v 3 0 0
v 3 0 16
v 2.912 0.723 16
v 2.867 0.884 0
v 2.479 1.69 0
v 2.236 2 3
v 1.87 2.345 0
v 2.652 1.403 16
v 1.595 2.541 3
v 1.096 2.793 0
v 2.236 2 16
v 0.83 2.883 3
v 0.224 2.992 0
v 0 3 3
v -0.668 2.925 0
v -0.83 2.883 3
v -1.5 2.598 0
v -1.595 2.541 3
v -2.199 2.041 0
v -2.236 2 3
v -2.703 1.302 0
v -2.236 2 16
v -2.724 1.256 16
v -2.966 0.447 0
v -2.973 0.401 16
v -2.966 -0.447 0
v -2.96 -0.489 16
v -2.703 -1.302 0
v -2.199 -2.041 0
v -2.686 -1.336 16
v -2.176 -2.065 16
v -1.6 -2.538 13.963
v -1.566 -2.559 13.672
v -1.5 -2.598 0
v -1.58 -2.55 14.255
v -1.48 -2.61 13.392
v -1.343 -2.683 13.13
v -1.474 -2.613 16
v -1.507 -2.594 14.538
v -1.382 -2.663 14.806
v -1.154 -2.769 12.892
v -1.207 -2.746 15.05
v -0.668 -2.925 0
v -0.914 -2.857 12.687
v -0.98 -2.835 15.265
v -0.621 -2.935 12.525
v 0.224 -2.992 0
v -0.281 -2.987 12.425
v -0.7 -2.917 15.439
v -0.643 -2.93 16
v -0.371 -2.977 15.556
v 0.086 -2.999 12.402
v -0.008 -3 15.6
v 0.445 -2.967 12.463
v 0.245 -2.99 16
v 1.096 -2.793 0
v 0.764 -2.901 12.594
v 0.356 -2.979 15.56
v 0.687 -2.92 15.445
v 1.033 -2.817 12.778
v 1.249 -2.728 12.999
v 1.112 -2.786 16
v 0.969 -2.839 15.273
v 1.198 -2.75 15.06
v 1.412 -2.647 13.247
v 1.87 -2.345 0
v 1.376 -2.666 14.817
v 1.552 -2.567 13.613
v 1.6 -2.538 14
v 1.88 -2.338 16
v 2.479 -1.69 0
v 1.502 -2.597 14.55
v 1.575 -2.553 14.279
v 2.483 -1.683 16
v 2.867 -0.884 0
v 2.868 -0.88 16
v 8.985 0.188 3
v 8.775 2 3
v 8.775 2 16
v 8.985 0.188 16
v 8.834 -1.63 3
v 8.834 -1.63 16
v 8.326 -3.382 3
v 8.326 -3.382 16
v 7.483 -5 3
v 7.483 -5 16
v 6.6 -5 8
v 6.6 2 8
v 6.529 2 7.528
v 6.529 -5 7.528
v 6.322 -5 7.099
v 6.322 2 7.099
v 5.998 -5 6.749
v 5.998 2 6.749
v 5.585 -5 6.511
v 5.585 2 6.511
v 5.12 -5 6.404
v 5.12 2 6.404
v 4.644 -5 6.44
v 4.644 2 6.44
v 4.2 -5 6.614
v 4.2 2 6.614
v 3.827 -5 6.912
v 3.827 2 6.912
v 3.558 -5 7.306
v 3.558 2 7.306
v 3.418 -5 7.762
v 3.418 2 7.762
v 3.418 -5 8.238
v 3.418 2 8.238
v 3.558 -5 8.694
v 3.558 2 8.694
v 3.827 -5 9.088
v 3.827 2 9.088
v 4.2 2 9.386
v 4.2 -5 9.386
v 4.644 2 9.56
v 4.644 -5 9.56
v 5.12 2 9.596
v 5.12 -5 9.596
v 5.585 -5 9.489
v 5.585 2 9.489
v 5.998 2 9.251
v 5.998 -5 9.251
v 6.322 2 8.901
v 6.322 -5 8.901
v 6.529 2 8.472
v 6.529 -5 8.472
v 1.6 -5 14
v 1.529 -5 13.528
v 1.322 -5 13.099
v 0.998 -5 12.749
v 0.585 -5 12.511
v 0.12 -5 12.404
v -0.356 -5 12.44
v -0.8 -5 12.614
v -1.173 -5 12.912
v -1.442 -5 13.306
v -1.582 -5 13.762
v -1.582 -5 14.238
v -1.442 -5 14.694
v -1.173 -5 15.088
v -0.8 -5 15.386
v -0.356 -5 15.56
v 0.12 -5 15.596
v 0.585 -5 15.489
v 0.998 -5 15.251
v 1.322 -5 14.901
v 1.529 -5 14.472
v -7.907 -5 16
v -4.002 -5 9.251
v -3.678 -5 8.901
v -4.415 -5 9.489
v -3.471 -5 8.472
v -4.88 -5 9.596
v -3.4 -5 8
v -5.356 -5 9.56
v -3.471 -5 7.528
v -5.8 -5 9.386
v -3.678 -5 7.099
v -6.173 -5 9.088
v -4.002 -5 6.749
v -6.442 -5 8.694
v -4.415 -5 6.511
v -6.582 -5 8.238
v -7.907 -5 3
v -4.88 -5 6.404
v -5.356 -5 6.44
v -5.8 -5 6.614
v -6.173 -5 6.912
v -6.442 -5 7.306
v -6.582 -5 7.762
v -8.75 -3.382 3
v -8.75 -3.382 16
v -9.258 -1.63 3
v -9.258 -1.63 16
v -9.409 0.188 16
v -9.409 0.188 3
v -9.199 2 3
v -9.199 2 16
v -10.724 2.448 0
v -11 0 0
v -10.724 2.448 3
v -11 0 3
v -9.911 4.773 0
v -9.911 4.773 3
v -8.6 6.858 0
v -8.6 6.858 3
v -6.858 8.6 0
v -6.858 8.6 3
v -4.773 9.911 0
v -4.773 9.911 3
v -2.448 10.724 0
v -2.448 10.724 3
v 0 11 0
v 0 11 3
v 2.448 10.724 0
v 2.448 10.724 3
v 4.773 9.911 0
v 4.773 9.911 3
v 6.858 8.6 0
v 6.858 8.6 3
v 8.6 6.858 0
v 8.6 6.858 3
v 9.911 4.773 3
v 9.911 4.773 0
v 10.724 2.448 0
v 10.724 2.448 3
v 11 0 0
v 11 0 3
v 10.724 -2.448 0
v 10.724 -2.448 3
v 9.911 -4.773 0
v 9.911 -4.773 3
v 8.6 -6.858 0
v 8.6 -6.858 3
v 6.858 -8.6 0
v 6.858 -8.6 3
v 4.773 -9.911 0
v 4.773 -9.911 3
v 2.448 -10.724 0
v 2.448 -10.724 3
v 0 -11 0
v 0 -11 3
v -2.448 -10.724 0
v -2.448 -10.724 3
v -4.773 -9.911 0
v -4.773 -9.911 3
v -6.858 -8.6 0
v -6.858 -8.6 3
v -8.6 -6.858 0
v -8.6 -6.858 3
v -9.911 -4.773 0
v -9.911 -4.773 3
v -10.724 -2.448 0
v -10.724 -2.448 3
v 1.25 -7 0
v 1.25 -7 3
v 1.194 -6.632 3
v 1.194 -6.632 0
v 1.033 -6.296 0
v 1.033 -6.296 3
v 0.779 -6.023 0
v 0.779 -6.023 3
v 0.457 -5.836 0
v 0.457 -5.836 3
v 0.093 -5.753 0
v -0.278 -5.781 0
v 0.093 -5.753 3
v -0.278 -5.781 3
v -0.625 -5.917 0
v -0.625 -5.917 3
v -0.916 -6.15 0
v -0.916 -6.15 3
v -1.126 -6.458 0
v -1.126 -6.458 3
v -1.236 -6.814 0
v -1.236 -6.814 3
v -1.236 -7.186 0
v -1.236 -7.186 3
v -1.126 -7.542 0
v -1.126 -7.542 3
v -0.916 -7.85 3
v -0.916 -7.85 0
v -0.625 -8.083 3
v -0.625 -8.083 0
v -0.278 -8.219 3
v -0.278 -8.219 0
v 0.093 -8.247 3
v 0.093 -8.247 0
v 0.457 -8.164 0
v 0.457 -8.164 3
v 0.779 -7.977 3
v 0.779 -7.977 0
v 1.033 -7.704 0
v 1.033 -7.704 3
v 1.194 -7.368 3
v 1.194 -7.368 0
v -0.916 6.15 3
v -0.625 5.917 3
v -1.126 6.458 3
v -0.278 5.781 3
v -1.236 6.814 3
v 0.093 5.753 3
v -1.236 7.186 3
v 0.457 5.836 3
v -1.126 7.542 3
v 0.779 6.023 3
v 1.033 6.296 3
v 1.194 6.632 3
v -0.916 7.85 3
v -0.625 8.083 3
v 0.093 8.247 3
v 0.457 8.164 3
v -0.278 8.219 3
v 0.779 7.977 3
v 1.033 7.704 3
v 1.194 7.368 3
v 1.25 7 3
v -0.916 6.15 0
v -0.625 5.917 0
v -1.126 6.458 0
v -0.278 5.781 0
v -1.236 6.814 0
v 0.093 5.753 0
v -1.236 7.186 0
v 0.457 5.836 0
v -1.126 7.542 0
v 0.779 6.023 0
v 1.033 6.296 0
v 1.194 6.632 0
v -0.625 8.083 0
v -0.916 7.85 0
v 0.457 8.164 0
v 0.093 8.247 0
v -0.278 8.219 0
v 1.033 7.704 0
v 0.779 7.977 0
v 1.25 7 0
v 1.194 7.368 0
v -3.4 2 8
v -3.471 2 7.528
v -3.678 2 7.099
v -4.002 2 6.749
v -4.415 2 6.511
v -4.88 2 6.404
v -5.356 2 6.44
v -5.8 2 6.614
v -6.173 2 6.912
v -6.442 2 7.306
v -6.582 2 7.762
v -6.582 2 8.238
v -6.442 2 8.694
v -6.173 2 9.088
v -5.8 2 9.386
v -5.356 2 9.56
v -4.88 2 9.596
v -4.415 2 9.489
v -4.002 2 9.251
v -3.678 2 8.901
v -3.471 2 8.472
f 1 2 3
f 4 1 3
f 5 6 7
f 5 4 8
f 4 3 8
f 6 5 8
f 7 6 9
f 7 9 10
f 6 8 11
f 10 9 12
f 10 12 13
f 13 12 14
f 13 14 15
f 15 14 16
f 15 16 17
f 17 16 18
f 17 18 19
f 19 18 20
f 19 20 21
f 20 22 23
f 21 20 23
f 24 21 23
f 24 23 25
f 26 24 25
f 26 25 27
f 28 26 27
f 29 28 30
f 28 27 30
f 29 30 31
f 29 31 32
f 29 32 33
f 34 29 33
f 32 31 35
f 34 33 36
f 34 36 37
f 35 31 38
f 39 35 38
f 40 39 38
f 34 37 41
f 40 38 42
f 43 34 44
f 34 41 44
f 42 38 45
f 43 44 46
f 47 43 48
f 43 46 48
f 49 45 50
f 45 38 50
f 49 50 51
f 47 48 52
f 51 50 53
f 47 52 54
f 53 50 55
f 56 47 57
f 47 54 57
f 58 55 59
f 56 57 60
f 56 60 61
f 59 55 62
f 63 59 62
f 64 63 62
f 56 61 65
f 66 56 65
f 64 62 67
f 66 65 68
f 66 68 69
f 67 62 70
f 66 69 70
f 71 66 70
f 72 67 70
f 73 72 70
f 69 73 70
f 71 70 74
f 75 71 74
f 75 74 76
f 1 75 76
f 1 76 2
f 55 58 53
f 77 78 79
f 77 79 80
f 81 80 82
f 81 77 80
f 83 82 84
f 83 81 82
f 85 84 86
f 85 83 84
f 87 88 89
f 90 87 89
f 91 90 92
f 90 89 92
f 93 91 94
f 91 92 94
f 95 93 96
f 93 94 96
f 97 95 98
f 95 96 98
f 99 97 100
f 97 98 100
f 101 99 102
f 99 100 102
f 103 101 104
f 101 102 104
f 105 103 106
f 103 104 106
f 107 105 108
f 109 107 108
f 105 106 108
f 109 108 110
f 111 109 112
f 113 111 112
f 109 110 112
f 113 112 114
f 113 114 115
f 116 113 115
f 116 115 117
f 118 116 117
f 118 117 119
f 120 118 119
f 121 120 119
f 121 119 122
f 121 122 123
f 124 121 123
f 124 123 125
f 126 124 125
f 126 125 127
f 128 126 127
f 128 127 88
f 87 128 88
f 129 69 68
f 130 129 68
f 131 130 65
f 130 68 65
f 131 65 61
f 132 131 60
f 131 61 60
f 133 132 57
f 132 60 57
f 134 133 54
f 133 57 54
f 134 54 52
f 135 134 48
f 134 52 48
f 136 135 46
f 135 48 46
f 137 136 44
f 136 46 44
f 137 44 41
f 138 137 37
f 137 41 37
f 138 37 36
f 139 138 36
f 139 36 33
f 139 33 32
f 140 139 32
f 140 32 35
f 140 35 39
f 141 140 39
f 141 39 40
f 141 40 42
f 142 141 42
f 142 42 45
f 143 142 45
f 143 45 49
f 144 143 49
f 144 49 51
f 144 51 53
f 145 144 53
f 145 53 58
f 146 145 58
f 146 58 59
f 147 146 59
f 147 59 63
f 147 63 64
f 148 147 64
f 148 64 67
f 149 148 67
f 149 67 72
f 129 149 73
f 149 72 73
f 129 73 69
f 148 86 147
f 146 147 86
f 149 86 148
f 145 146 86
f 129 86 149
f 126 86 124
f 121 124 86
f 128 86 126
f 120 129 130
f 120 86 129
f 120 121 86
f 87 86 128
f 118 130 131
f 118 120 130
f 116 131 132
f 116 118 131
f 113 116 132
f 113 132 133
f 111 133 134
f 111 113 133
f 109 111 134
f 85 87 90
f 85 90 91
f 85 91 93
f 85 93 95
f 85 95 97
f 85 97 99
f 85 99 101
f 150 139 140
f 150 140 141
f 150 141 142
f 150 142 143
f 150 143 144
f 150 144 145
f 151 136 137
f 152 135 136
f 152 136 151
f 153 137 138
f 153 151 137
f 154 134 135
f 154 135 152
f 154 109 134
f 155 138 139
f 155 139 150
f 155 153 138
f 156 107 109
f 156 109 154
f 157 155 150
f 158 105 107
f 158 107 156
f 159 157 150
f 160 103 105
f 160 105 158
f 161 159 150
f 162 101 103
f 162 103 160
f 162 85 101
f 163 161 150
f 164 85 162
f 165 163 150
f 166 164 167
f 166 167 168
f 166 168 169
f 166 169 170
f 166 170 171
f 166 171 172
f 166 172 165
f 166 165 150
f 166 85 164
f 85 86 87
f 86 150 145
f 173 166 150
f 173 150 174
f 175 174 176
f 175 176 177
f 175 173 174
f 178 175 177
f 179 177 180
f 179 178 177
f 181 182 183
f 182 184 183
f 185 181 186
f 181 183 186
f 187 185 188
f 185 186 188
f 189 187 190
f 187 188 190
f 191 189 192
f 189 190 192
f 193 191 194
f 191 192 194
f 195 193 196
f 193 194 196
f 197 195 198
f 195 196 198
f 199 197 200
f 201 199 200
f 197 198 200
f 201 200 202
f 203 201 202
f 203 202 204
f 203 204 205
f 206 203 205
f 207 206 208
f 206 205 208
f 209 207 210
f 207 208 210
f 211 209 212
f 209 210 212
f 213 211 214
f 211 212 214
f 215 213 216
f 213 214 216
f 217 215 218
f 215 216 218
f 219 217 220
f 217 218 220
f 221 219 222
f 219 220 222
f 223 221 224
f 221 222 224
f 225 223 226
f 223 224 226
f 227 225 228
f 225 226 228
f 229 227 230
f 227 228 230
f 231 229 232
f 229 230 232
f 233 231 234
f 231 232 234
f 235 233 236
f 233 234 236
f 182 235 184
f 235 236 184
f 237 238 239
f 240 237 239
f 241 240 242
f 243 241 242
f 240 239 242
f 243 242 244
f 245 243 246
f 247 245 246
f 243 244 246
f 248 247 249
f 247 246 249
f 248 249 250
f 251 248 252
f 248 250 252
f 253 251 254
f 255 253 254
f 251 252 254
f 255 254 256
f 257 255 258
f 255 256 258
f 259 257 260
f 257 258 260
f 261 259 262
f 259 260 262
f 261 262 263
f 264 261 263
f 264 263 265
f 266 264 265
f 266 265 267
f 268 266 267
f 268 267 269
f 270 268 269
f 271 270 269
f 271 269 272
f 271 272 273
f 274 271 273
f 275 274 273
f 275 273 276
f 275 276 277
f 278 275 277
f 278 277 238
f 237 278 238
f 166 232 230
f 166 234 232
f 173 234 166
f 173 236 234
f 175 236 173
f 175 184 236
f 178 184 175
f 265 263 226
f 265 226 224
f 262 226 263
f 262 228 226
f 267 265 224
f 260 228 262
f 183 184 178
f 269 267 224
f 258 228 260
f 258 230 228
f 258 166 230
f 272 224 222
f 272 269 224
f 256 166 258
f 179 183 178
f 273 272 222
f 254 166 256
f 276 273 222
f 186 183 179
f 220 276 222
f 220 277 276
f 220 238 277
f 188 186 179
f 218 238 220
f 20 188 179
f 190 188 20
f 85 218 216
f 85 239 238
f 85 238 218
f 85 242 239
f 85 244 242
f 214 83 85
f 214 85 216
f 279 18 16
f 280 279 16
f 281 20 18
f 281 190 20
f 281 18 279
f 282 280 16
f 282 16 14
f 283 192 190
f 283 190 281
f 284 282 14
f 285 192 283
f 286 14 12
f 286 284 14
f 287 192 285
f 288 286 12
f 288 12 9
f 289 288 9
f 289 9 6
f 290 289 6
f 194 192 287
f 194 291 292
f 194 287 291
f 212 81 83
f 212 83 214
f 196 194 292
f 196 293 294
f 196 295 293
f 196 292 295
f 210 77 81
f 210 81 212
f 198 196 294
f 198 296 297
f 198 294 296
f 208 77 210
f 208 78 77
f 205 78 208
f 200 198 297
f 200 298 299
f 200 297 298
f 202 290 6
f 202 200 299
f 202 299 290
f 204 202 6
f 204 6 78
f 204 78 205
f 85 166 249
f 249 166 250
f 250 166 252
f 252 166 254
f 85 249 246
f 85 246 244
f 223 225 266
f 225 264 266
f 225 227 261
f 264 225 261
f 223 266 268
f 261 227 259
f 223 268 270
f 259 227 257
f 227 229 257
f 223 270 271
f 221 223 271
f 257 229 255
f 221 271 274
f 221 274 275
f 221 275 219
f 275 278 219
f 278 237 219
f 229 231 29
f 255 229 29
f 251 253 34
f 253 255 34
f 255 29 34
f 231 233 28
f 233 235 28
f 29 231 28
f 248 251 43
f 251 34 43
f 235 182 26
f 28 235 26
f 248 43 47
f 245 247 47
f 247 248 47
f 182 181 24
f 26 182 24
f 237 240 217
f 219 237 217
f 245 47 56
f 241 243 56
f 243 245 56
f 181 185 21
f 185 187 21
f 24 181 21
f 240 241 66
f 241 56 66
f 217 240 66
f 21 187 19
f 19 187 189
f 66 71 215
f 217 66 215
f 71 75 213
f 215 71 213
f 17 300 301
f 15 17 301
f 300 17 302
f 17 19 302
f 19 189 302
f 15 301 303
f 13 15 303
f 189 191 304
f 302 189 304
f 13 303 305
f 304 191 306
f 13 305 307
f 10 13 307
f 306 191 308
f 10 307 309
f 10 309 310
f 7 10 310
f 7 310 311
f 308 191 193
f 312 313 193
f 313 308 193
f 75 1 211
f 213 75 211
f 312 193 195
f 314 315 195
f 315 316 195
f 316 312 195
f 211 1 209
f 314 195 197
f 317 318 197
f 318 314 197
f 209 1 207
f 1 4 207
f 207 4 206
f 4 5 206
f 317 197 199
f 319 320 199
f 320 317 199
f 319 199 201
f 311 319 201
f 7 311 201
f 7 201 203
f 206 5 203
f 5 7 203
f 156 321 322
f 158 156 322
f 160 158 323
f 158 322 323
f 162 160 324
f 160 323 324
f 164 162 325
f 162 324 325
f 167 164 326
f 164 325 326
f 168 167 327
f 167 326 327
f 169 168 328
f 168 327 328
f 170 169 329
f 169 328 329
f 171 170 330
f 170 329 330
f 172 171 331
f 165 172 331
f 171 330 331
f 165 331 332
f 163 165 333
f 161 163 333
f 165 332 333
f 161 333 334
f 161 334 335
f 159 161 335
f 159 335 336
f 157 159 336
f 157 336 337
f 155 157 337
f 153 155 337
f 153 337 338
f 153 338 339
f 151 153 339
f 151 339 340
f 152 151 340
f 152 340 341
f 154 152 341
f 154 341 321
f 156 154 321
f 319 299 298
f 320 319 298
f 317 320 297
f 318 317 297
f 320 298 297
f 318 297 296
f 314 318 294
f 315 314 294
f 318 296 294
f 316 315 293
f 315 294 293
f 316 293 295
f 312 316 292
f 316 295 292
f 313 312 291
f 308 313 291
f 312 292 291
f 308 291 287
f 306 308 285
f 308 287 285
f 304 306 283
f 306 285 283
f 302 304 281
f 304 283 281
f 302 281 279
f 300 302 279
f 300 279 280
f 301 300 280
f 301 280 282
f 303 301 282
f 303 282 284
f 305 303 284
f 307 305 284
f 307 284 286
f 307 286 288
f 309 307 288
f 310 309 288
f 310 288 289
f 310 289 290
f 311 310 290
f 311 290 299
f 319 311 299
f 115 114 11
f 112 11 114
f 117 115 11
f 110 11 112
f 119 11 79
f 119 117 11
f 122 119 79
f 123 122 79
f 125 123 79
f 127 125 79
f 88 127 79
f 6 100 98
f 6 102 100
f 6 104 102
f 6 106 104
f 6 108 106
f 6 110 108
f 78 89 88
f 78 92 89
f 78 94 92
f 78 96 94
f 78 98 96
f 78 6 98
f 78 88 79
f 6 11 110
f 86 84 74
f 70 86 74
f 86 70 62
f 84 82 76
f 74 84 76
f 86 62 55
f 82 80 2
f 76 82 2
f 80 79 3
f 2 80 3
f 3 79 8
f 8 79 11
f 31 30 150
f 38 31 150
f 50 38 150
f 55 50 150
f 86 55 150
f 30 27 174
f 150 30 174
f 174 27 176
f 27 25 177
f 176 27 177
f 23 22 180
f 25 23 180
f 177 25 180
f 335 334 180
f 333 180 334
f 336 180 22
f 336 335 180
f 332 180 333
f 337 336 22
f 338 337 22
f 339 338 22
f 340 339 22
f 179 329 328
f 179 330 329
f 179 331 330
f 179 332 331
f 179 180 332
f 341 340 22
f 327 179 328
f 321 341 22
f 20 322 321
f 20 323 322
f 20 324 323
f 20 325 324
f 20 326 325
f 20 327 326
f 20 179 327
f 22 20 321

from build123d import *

# Parameters (mm, degrees)
SKETCH_1_W                  = 11
SKETCH_1_H                  = 3
EXTRUDE_1_DEPTH             = 13
HOLE_WIZARD_2_5_2_5_1_D     = 2.5
HOLE_WIZARD_2_5_2_5_1_DEPTH = 16
HOLE_WIZARD_3_2_3_2_1_D     = 3.2
HOLE_WIZARD_3_2_3_2_1_DEPTH = 16
HOLE_WIZARD_6_0_6_1_D       = 6
HOLE_WIZARD_3_2_3_2_2_D     = 3.2
HOLE_WIZARD_3_2_3_2_2_DEPTH = 16


with BuildPart() as part:
    # 草图1 → 旋转1 (revolve)
    with BuildSketch(Plane.XZ, mode=Mode.PRIVATE) as revolve_1_sk:
        with Locations((5.5, 1.5)):
            Rectangle(SKETCH_1_W, SKETCH_1_H)
    revolve(revolve_1_sk.sketch.rotate(Axis((0, 0, 3), (0, 0, -1)), 180), axis=Axis((0, 0, 3), (0, 0, -1)))

    # 草图2 → 凸台-拉伸1 (add)
    with BuildSketch(Plane.XY.offset(3)):
        with BuildLine():
            Line((7.483314774, -5), (-7.907139717, -5))
            ThreePointArc((-7.907139717, -5), (-9.257527395, -1.630006909), (-9.198789331, 2))
            Line((-9.198789331, 2), (8.774964387, 2))
            ThreePointArc((8.774964387, 2), (8.833702451, -1.630006909), (7.483314774, -5))
        make_face()
    extrude(amount=EXTRUDE_1_DEPTH)

    # Ø2.5 (2.5) 直径孔1
    with Locations(Plane(origin=(0, 0, 0), x_dir=(-1, 0, 0), z_dir=(0, 0, -1))):
        with Locations((0, -7), (0, 7)):
            Hole(HOLE_WIZARD_2_5_2_5_1_D / 2, depth=HOLE_WIZARD_2_5_2_5_1_DEPTH)

    # Ø3.2 (3.2) 直径孔1
    with Locations(Plane(origin=(0, -5, 0), x_dir=(-1, 0, 0), z_dir=(0, -1, 0))):
        with Locations((5, -8), (-5, -8)):
            Hole(HOLE_WIZARD_3_2_3_2_1_D / 2, depth=HOLE_WIZARD_3_2_3_2_1_DEPTH)

    # Ø6.0 (6) 直径孔1 (through all)
    with Locations(Plane(origin=(0, 0, 0), x_dir=(-1, 0, 0), z_dir=(0, 0, -1))):
        with Locations((0, 0)):
            Hole(HOLE_WIZARD_6_0_6_1_D / 2)

    # Ø3.2 (3.2) 直径孔2
    with Locations(Plane(origin=(0, -5, 0), x_dir=(-1, 0, 0), z_dir=(0, -1, 0))):
        with Locations((0, -14)):
            Hole(HOLE_WIZARD_3_2_3_2_2_D / 2, depth=HOLE_WIZARD_3_2_3_2_2_DEPTH)


solid = part.part
